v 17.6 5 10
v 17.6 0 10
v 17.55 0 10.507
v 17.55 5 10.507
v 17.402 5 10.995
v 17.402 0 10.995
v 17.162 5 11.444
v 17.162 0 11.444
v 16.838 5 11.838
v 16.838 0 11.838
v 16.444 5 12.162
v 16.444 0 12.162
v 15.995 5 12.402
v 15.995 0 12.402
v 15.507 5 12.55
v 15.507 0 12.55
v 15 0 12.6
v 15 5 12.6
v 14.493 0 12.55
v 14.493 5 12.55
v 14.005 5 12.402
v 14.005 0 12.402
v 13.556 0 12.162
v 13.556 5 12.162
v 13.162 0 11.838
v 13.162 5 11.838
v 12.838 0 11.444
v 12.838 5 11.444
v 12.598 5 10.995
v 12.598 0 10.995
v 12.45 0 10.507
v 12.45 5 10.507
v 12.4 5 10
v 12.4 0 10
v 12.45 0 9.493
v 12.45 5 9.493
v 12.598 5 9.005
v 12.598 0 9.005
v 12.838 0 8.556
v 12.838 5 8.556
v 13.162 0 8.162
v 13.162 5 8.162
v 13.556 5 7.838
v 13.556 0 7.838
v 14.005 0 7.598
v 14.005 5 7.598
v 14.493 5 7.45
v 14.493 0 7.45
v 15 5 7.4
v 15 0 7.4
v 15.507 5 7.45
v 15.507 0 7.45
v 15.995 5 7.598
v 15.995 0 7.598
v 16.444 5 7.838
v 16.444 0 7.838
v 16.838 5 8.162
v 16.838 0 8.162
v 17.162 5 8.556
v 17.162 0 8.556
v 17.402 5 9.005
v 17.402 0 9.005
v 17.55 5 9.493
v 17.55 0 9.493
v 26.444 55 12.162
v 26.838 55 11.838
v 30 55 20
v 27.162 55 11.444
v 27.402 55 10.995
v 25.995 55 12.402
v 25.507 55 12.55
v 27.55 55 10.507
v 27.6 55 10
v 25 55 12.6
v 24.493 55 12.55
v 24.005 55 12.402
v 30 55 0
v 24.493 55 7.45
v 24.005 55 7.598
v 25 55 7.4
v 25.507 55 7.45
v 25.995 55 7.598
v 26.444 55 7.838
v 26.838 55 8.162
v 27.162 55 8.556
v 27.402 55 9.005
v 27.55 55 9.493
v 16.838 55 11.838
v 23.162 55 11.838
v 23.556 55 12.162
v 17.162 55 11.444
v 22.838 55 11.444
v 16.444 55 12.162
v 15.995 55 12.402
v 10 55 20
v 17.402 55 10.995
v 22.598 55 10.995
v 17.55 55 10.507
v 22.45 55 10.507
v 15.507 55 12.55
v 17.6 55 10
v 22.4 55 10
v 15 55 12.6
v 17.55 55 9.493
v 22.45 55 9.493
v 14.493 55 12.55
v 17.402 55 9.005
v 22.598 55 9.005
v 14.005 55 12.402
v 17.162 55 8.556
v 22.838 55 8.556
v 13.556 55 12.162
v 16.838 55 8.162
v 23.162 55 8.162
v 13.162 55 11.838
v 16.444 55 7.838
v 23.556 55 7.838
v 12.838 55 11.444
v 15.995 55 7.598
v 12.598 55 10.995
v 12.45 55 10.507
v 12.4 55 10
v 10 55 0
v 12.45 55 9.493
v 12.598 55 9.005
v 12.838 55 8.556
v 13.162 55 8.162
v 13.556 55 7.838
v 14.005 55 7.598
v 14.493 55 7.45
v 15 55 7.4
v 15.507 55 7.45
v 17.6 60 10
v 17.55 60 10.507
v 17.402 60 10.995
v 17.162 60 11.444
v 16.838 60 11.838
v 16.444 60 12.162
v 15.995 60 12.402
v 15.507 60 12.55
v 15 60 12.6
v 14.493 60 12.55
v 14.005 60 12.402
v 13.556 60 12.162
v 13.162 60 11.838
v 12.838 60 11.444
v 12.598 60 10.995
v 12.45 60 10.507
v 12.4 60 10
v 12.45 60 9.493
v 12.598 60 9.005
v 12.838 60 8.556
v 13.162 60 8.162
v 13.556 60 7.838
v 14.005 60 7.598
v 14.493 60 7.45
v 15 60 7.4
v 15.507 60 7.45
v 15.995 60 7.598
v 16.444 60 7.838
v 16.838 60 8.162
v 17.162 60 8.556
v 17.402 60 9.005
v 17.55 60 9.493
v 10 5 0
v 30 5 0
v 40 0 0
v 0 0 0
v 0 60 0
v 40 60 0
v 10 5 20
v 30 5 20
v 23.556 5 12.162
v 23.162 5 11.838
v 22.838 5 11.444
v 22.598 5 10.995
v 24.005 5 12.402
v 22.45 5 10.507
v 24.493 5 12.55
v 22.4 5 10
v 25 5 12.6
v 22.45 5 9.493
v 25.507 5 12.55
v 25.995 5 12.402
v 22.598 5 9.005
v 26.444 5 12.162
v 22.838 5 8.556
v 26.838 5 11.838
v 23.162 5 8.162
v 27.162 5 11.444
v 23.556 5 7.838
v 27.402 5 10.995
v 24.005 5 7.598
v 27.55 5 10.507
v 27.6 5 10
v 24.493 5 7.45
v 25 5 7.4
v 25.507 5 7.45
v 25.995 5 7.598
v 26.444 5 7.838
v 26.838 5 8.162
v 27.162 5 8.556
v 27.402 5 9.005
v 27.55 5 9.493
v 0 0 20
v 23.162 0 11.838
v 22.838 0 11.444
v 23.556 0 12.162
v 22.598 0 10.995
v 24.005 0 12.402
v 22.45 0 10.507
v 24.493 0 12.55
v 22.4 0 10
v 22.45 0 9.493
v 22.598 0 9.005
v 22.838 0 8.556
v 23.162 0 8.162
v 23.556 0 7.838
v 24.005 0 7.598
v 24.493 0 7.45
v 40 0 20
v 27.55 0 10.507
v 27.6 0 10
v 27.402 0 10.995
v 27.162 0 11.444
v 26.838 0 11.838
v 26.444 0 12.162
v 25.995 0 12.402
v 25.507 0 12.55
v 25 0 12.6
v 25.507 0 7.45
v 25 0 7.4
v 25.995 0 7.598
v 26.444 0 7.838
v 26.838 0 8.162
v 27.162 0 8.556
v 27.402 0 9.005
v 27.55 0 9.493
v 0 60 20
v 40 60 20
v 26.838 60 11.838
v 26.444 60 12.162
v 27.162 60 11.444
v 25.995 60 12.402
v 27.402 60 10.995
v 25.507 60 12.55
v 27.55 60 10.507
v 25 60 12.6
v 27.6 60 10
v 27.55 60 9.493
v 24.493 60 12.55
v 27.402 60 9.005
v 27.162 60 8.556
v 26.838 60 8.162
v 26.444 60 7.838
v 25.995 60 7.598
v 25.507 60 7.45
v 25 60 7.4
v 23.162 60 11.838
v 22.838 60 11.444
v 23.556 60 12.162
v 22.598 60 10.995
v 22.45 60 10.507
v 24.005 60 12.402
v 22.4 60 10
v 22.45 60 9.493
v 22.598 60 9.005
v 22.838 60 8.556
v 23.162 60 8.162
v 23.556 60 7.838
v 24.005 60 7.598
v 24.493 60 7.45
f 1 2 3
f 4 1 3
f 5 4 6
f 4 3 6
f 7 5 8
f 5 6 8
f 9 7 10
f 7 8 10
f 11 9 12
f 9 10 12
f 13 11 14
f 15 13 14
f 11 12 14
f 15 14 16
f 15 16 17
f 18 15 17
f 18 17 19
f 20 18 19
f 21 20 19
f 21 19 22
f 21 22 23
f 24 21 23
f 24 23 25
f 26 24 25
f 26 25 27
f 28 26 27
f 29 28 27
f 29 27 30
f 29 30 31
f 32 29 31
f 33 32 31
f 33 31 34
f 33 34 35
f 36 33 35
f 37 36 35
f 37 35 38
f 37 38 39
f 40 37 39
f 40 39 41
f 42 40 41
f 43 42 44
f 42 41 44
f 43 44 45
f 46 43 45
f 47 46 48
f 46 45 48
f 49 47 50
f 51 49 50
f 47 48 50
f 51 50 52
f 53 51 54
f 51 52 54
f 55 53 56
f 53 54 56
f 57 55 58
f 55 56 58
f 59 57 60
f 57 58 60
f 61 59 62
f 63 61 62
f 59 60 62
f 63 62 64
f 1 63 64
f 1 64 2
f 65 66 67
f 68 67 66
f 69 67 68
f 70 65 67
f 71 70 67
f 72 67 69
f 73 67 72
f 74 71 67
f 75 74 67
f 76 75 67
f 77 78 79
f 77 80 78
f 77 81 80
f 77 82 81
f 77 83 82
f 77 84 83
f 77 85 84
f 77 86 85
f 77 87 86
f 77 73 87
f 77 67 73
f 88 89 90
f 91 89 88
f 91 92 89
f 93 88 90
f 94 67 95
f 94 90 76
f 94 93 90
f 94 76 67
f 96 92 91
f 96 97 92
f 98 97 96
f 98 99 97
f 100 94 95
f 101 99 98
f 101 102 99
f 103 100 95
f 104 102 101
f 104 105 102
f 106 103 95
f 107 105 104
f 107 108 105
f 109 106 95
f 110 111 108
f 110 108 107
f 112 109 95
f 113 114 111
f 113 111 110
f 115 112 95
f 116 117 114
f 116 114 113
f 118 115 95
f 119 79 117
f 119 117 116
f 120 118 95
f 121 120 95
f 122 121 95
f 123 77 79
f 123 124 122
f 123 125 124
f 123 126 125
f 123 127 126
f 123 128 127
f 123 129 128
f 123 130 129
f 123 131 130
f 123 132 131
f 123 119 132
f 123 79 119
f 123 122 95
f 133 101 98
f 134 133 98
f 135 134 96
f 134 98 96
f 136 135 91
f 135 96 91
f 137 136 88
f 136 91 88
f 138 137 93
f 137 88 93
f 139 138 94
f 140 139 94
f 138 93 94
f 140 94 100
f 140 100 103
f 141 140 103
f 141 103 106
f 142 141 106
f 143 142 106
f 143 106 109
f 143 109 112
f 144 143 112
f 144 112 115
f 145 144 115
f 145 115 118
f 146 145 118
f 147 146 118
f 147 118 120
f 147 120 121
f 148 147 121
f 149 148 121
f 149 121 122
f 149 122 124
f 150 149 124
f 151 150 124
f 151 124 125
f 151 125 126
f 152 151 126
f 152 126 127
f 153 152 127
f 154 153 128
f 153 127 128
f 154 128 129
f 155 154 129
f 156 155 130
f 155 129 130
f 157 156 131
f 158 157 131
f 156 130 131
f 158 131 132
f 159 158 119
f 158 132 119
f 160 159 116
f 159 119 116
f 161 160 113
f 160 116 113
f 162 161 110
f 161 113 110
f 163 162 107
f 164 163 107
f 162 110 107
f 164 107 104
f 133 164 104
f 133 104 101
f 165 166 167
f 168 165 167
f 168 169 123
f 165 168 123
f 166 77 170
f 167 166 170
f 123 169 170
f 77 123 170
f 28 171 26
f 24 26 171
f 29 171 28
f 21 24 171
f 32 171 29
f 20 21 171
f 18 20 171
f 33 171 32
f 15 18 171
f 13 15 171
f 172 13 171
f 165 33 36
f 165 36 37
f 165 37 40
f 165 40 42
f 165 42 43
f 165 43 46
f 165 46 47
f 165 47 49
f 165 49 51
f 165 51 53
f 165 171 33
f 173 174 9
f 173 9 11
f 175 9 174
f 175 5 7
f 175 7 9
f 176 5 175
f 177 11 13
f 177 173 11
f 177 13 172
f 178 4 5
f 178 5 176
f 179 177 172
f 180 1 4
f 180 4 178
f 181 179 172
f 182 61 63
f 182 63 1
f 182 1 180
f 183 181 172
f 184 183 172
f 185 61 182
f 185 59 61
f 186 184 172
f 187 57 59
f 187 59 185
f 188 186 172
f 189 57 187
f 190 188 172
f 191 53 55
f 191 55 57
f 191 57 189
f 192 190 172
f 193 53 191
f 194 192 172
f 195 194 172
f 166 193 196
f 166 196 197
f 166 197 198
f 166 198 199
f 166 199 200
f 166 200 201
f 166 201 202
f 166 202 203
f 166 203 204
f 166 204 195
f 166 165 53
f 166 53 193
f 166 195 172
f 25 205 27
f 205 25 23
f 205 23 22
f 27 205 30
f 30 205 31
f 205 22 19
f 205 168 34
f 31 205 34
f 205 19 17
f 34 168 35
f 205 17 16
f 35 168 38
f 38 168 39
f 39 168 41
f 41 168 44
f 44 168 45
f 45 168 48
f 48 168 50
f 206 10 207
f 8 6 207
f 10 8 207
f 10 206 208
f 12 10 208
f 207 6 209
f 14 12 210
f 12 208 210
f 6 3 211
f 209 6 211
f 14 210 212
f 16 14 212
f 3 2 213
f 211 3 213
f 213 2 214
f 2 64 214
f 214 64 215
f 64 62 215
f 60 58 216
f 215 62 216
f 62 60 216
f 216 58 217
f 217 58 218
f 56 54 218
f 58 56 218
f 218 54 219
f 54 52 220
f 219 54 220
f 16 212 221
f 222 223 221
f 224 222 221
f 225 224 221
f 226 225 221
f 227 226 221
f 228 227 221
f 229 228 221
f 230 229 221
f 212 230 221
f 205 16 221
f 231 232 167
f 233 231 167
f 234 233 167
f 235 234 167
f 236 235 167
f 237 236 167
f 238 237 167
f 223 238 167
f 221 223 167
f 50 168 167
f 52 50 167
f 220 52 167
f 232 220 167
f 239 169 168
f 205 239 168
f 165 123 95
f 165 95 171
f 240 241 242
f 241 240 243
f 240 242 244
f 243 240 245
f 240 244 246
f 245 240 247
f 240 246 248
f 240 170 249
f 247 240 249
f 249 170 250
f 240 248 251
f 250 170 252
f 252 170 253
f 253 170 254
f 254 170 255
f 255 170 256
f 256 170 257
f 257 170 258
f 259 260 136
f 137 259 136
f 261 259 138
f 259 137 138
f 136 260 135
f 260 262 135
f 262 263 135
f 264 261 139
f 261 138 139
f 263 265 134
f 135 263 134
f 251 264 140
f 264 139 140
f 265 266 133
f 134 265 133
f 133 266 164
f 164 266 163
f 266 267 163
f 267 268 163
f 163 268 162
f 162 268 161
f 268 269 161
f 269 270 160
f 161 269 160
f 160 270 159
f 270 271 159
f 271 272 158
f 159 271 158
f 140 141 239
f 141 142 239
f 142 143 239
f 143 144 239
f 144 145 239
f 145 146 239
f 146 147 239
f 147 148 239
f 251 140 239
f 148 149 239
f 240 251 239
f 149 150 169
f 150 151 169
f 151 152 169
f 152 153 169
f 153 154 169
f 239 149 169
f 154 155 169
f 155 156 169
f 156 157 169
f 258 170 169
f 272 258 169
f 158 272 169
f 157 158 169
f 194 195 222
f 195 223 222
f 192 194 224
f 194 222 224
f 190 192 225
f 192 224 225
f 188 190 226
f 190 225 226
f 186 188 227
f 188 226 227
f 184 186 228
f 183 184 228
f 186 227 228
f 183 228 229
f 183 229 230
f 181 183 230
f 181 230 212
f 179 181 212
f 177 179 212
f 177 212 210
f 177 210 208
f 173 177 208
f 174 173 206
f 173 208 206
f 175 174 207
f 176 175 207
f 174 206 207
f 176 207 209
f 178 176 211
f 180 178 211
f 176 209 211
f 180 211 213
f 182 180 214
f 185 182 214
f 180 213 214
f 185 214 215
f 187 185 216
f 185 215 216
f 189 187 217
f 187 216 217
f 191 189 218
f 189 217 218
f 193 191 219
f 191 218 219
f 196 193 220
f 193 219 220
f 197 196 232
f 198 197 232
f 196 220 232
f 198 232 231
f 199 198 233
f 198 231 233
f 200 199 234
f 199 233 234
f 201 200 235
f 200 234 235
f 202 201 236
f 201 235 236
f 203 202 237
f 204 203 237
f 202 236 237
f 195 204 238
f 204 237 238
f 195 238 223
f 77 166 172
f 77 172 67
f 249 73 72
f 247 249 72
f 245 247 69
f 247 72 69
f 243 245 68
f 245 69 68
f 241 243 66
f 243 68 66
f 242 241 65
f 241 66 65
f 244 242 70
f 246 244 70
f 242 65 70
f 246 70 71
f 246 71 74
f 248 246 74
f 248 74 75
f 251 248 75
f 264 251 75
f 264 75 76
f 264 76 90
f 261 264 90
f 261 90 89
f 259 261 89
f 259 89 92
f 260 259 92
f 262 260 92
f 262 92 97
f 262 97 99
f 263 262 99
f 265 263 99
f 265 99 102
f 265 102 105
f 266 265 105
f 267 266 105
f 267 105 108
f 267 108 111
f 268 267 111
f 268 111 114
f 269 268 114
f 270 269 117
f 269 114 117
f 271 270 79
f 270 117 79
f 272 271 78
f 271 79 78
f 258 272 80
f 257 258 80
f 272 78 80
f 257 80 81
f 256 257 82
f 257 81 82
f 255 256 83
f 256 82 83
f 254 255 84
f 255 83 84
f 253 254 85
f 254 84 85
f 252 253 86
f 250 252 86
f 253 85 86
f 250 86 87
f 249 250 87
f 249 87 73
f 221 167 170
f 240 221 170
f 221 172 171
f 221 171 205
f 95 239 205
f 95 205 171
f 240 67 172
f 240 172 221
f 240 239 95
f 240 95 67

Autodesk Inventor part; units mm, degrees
ref_plane "YZ Plane" through (0, 0, 0) normal (1, 0, 0) x (0, 1, 0)
ref_plane "XZ Plane" through (0, 0, 0) normal (0, 1, 0) x (-1, 0, 0)
sketch "스케치1" plane through (0, 0, 0) normal (0, 0, 1) x (1, 0, 0)
  line L0 (0, 0) -> (40, 0)
  line L1 (40, 0) -> (40, 60)
  line L2 (40, 60) -> (0, 60)
  line L3 (0, 60) -> (0, 0)
  line L4 (10, 5) -> (30, 5)
  line L5 (30, 5) -> (30, 55)
  line L6 (30, 55) -> (10, 55)
  line L7 (10, 55) -> (10, 5)
  point P0 (20, 55)
  point P1 (20, 60)
  point P2 (10, 30)
  point P3 (0, 30)
  dimension "d0" = 60
  dimension "d1" = 40
  dimension "d4" = 5
  dimension "d5" = 10
extrude "돌출1" add sketch "스케치1" along normal blind 20 contours L3 L2 L1 L0 | L7 L6 L5 L4
extrude "돌출2" cut sketch "스케치1" along normal blind 20 contours L7 L6 L5 L4
sketch "스케치2" plane through (0, 0, 0) normal (0, -1, 0) x (1, 0, 0)
  line L0 (10, 0) -> (10, 20) projected
  line L1 (0, 0) -> (40, 0) projected
  line L2 (40, 0) -> (40, 20) projected
  line L3 (0, 20) -> (40, 20) projected
  line L4 (0, 0) -> (0, 20) projected
  line L5 (30, 0) -> (30, 20) projected
  circle A0 centre (15, 10) radius 2.6
  circle A1 centre (25, 10) radius 2.6
  point P0 (10, 10)
  point P1 (20, 20)
  dimension "d11" = 5.2
  dimension "d12" = 5.2
  dimension "d13" = 10
  dimension "d14" = 5
extrude "돌출3" cut sketch "스케치2" against normal through all contours A0 | A1
ref_plane "작업 평면1" through (0, 30, 0) normal (0, -1, 0) x (1, 0, 0)
properties part number "다리 연결 부품"
